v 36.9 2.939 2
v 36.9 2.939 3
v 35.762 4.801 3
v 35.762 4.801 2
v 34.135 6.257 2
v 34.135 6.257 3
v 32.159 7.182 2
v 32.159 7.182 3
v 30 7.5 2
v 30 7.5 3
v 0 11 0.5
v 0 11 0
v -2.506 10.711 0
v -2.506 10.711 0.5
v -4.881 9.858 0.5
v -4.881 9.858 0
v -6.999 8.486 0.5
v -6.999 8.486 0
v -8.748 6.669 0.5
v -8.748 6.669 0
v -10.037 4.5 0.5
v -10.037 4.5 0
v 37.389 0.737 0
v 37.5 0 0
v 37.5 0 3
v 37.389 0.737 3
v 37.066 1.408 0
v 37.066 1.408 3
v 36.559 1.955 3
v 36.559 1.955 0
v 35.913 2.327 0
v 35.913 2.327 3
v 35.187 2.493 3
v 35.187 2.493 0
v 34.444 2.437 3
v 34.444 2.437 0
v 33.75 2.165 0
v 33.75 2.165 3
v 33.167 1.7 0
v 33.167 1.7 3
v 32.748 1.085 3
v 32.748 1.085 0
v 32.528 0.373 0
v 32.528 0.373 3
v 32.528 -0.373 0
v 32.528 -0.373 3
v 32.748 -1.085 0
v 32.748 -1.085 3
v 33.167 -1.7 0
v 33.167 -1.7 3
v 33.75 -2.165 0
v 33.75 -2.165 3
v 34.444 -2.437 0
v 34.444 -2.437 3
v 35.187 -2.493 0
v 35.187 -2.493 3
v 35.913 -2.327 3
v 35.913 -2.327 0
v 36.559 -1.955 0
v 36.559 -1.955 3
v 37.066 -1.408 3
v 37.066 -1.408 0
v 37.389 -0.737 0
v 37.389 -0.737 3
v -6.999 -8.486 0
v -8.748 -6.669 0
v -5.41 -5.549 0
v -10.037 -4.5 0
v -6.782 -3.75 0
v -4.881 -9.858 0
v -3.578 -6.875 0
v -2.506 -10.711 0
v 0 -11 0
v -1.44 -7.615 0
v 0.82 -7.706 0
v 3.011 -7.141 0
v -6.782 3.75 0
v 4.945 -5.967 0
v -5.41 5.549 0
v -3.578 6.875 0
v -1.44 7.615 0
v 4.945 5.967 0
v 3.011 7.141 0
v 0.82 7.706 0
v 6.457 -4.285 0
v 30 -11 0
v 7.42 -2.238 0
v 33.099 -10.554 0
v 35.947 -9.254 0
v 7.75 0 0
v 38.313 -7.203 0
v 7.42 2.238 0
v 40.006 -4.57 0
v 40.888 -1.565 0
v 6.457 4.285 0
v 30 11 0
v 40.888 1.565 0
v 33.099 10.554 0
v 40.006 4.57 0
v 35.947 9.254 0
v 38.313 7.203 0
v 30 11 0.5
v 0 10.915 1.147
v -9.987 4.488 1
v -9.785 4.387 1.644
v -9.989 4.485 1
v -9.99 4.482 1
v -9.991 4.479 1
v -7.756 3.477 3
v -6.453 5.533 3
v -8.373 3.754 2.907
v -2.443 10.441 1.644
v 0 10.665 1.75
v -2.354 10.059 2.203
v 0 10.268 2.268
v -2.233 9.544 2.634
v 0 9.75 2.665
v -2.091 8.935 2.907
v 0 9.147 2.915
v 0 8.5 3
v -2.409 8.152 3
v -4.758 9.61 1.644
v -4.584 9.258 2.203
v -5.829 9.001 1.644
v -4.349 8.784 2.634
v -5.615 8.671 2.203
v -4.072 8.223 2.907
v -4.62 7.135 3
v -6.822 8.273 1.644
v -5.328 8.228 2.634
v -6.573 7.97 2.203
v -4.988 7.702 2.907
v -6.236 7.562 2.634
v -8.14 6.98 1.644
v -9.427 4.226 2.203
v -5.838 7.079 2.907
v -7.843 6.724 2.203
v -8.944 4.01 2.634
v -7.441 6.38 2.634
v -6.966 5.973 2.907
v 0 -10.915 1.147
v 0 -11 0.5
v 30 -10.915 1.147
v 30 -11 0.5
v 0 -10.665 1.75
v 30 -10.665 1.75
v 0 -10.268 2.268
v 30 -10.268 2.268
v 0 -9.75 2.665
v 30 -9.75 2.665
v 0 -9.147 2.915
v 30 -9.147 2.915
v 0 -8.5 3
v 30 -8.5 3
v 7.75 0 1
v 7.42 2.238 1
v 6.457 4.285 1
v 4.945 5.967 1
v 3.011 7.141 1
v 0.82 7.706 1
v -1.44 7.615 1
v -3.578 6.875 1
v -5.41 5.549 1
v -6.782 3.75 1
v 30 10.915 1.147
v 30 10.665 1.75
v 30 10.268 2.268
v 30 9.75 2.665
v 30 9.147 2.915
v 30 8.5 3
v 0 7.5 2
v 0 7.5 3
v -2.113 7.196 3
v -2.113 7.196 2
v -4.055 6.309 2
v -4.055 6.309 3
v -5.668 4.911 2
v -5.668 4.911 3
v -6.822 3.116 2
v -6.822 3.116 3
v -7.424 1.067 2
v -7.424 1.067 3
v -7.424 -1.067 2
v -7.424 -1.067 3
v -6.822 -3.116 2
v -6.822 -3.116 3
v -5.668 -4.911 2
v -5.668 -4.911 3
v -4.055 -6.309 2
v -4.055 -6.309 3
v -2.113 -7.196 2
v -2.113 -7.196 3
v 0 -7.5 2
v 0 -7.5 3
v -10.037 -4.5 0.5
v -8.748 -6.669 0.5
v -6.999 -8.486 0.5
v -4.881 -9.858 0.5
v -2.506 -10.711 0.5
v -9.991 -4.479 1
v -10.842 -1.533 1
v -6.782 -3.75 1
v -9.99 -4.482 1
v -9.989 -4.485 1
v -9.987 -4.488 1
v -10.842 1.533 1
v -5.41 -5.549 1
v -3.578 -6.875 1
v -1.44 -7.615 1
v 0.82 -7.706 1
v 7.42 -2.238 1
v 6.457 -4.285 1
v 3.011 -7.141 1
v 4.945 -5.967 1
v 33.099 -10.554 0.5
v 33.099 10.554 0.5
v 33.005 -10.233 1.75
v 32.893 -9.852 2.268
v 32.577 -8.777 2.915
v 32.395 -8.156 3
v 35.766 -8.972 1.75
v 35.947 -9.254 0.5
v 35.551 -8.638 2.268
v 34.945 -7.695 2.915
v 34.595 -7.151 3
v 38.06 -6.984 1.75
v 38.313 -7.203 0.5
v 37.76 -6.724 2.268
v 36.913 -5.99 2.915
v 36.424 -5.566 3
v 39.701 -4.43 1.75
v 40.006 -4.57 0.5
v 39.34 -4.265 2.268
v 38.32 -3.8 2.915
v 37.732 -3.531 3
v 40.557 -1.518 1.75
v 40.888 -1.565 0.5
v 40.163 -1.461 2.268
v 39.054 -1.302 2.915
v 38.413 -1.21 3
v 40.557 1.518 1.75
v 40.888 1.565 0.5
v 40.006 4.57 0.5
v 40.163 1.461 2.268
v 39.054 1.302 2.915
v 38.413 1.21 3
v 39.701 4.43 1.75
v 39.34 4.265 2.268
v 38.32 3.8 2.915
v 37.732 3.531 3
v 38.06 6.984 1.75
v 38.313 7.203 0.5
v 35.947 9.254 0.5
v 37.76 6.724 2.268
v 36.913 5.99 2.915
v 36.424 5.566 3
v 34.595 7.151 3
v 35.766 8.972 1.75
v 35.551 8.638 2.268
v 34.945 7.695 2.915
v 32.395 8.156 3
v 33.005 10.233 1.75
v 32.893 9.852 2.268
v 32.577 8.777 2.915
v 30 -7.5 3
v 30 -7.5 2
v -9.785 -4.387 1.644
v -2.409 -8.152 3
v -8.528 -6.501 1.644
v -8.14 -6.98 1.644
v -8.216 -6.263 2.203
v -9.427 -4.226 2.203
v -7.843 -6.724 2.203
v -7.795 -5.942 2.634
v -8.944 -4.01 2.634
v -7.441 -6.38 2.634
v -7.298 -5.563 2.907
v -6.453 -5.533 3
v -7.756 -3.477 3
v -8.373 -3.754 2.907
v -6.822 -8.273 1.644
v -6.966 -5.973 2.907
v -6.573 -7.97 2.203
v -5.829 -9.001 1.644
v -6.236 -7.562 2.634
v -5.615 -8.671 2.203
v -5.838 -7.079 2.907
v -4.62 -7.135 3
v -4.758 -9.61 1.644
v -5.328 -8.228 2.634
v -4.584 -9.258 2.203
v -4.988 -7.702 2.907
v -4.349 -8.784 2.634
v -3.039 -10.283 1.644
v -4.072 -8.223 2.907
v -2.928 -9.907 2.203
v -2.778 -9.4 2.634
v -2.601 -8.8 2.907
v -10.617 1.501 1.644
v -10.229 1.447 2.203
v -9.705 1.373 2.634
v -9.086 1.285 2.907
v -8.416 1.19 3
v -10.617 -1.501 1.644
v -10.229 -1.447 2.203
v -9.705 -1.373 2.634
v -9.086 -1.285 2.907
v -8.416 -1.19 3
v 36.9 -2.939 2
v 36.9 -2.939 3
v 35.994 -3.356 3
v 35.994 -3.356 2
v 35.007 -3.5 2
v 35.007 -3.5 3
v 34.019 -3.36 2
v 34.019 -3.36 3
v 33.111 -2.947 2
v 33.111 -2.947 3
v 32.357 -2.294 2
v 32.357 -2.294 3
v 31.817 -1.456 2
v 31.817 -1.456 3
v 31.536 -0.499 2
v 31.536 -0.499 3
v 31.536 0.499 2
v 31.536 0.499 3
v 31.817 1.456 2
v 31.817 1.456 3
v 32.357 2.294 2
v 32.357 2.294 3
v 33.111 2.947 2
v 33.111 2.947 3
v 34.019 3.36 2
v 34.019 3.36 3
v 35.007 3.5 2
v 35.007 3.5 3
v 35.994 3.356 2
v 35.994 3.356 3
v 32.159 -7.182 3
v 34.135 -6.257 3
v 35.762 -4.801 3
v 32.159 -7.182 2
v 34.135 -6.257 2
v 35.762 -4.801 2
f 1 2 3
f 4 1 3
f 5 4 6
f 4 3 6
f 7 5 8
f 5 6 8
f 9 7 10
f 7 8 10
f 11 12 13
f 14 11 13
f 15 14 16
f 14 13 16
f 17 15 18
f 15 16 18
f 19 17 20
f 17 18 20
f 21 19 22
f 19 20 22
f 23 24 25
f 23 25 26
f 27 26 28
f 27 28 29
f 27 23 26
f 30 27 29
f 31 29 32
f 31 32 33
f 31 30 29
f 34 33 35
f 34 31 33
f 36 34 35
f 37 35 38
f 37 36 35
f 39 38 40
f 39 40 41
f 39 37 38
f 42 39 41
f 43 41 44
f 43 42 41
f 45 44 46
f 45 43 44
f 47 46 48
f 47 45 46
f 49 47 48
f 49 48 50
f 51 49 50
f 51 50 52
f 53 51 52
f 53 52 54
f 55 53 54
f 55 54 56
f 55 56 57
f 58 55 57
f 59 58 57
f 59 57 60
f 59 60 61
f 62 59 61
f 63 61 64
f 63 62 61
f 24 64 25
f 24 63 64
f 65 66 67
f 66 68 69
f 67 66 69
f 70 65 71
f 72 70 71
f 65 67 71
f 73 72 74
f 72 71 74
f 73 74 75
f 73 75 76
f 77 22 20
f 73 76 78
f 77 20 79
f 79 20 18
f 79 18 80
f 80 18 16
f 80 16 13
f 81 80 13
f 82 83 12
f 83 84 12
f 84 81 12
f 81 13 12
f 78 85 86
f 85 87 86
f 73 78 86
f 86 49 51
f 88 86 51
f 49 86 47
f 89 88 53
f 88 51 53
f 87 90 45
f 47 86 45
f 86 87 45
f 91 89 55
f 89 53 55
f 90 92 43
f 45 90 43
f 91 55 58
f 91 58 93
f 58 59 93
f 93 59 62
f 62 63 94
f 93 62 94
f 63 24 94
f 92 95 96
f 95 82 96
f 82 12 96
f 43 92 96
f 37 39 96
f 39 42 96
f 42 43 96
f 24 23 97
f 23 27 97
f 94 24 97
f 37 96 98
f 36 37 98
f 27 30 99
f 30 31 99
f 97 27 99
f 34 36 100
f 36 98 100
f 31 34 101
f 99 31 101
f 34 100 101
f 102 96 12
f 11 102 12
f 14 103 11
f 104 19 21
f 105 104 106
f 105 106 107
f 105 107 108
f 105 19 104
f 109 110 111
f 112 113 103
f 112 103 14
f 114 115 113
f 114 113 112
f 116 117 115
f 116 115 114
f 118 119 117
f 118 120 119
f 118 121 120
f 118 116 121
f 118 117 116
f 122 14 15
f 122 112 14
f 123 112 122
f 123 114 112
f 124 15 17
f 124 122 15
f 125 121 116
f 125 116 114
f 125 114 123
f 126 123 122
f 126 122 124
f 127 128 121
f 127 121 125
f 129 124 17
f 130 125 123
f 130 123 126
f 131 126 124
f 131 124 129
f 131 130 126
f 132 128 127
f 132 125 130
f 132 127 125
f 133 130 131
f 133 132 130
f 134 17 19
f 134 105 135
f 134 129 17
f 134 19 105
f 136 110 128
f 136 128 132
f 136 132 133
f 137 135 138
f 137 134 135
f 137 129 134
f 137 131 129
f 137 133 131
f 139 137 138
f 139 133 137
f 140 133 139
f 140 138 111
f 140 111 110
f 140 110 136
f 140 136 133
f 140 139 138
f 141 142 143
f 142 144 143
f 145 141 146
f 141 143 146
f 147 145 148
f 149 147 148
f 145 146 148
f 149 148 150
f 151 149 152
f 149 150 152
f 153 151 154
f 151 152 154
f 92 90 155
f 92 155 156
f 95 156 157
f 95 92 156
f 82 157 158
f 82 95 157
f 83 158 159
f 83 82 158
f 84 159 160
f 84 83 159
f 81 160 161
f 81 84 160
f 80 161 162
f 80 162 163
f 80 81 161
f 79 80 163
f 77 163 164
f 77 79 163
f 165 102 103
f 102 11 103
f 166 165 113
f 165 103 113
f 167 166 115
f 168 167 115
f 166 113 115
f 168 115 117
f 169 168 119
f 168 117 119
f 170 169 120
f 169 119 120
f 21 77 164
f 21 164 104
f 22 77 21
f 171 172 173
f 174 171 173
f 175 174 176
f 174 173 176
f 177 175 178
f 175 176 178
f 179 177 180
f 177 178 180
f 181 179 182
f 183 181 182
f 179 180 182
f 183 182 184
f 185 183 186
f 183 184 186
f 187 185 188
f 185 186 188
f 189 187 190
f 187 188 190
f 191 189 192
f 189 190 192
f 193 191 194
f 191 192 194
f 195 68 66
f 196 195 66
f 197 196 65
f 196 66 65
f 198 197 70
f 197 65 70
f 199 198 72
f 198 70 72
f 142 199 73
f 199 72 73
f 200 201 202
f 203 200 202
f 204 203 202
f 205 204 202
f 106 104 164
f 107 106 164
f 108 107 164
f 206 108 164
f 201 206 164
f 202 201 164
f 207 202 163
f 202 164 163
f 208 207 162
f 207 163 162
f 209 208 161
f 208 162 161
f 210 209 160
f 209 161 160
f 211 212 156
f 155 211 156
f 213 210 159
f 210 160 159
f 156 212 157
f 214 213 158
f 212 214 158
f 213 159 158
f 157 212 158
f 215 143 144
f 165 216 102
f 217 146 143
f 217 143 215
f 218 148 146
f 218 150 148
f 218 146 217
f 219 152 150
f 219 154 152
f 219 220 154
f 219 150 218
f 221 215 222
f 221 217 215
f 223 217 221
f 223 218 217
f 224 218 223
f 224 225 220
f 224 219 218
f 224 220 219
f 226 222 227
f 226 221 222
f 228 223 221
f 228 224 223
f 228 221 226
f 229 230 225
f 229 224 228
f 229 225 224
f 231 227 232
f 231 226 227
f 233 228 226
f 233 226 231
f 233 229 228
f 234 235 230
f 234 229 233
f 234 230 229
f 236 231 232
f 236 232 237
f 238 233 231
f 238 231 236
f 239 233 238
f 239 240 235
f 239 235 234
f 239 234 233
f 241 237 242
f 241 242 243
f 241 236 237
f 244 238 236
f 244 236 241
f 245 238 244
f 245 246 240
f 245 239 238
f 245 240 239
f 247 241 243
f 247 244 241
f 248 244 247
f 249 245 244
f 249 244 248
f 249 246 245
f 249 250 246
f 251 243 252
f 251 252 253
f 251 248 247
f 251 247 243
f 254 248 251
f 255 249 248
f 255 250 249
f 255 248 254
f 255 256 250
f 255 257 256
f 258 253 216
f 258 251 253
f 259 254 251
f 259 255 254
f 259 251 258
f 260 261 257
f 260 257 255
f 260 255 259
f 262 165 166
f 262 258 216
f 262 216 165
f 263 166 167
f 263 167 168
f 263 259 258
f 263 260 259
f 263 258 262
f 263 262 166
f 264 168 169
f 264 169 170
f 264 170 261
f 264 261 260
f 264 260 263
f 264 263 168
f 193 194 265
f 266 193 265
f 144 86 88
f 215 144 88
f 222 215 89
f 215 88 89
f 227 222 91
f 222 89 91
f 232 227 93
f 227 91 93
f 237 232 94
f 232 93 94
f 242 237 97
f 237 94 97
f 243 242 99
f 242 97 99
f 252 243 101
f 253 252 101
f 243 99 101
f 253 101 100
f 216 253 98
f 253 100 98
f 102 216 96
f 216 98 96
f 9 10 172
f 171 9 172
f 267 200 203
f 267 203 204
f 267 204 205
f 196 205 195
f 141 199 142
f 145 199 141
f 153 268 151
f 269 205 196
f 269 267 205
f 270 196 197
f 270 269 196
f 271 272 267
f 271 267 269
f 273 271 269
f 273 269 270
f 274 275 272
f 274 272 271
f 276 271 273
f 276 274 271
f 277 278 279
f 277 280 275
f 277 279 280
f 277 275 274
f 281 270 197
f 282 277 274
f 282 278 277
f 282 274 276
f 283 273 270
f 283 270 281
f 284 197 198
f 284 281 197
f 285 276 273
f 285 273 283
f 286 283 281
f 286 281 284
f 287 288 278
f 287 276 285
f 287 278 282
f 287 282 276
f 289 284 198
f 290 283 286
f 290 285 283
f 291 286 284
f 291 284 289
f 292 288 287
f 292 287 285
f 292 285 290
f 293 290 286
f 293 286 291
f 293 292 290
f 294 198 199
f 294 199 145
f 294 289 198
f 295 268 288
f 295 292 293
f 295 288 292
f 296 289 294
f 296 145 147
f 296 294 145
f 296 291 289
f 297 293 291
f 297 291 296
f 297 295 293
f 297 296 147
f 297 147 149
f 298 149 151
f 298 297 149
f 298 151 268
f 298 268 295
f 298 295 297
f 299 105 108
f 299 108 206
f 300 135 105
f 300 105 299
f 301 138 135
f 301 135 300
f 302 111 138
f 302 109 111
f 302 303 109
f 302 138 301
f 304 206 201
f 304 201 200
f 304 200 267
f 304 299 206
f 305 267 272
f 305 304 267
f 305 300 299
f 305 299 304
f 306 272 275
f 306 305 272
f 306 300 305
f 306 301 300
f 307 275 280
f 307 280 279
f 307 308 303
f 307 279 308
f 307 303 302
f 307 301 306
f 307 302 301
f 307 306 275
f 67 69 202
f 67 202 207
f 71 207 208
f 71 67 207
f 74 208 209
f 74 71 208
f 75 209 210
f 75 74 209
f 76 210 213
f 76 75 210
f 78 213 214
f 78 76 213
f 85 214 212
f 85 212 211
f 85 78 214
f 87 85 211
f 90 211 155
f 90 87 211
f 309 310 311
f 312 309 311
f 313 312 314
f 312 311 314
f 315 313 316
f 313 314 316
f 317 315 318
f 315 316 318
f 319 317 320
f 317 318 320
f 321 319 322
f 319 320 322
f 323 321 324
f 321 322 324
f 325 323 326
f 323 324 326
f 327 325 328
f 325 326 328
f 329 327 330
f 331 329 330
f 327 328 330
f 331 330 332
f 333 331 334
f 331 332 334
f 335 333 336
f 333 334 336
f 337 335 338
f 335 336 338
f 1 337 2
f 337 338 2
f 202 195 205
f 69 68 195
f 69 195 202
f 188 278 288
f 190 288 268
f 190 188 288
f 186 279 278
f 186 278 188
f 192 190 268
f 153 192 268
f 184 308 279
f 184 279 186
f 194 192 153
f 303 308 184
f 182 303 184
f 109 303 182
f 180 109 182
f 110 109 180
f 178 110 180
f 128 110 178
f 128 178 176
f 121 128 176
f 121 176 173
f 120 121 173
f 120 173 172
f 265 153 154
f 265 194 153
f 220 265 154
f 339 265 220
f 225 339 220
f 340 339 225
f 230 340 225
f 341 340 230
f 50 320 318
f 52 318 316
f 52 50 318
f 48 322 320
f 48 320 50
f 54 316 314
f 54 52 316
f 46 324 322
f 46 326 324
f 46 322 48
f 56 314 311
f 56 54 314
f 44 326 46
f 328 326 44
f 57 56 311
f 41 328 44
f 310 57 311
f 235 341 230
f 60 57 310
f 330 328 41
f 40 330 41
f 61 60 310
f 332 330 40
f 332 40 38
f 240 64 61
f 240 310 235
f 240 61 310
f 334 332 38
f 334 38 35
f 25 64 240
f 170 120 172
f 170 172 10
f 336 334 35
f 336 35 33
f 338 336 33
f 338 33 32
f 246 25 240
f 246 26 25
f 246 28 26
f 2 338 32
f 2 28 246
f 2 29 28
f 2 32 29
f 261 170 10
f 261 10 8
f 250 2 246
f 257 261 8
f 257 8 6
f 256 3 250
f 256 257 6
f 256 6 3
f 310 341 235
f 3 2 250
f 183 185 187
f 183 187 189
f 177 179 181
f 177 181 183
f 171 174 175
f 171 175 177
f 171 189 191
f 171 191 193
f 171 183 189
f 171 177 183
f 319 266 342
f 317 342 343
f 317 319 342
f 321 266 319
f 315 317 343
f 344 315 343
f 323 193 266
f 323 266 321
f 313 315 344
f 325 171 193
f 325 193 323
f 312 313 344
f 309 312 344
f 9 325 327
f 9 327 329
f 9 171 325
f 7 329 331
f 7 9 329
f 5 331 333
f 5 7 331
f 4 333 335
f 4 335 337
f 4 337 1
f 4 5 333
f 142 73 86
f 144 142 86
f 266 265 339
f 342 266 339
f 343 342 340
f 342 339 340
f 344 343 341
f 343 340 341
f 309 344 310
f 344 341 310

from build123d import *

# Parameters (mm, degrees)
F0_R     = 2.5
F1_DEPTH = 3
F2_R     = 2.5
F3_DEPTH = 1
F5_DEPTH = 1


with BuildPart() as f1:
    # F0 (on Top) → F1 (new body)
    with BuildSketch(Plane.XY):
        with BuildLine():
            Line((-10.03743, -4.5), (-10.03743, 4.5))
            ThreePointArc((-10.03743, 4.5), (-11, 0), (-10.03743, -4.5))
        make_face()
        with BuildLine():
            ThreePointArc((-6.78233, -3.75), (-7.75, 0), (-6.78233, 3.75))
            Line((-6.78233, 3.75), (-10.03743, 4.5))
            Line((-10.03743, 4.5), (-10.03743, -4.5))
            Line((-10.03743, -4.5), (-6.78233, -3.75))
        make_face()
        with BuildLine():
            ThreePointArc((-6.78233, 3.75), (1.93642, 7.504184), (7.75, 0))
            ThreePointArc((7.75, 0), (1.93642, -7.504184), (-6.78233, -3.75))
            Line((-6.78233, -3.75), (-10.03743, -4.5))
            ThreePointArc((-10.03743, -4.5), (-5.97913, -9.233093), (0, -11))
            Line((0, -11), (30, -11))
            ThreePointArc((30, -11), (41, 0), (30, 11))
            Line((30, 11), (0, 11))
            ThreePointArc((0, 11), (-5.97913, 9.233093), (-10.03743, 4.5))
            Line((-10.03743, 4.5), (-6.78233, 3.75))
        make_face()
        with Locations((35, 0)):
            Circle(F0_R, mode=Mode.SUBTRACT)
        with BuildLine():
            Line((-6.78233, -3.75), (-6.78233, 3.75))
            ThreePointArc((-6.78233, 3.75), (-7.75, 0), (-6.78233, -3.75))
        make_face()
        with BuildLine():
            ThreePointArc((-6.78233, -3.75), (1.93642, -7.504184), (7.75, 0))
            ThreePointArc((7.75, 0), (1.93642, 7.504184), (-6.78233, 3.75))
            Line((-6.78233, 3.75), (-6.78233, -3.75))
        make_face()
    extrude(amount=F1_DEPTH)

    # F2
    f2_edges = [f1.edges().sort_by_distance(p)[0] for p in [
        (-11, 0, 3),
    ]]
    fillet(f2_edges, radius=F2_R)

    # F0 (on Top) → F3 (cut)
    with BuildSketch(Plane.XY):
        with BuildLine():
            Line((-10.03743, -4.5), (-10.03743, 4.5))
            ThreePointArc((-10.03743, 4.5), (-11, 0), (-10.03743, -4.5))
        make_face()
        with BuildLine():
            ThreePointArc((-6.78233, -3.75), (-7.75, 0), (-6.78233, 3.75))
            Line((-6.78233, 3.75), (-10.03743, 4.5))
            Line((-10.03743, 4.5), (-10.03743, -4.5))
            Line((-10.03743, -4.5), (-6.78233, -3.75))
        make_face()
        with BuildLine():
            Line((-6.78233, -3.75), (-6.78233, 3.75))
            ThreePointArc((-6.78233, 3.75), (-7.75, 0), (-6.78233, -3.75))
        make_face()
        with BuildLine():
            ThreePointArc((-6.78233, -3.75), (1.93642, -7.504184), (7.75, 0))
            ThreePointArc((7.75, 0), (1.93642, 7.504184), (-6.78233, 3.75))
            Line((-6.78233, 3.75), (-6.78233, -3.75))
        make_face()
    extrude(amount=F3_DEPTH, mode=Mode.SUBTRACT)

    # F4 (on face) → F5 (cut)
    with BuildSketch(Plane.XY.offset(3)):
        with BuildLine():
            ThreePointArc((36.9, -2.939388), (31.5, 0), (36.9, 2.939388))
            ThreePointArc((36.9, 2.939388), (34.135492, 6.256813), (30, 7.5))
            Line((30, 7.5), (0, 7.5))
            ThreePointArc((0, 7.5), (-7.5, 0), (0, -7.5))
            Line((0, -7.5), (30, -7.5))
            ThreePointArc((30, -7.5), (34.135492, -6.256813), (36.9, -2.939388))
        make_face()
    extrude(amount=-F5_DEPTH, mode=Mode.SUBTRACT)


solid = f1.part
